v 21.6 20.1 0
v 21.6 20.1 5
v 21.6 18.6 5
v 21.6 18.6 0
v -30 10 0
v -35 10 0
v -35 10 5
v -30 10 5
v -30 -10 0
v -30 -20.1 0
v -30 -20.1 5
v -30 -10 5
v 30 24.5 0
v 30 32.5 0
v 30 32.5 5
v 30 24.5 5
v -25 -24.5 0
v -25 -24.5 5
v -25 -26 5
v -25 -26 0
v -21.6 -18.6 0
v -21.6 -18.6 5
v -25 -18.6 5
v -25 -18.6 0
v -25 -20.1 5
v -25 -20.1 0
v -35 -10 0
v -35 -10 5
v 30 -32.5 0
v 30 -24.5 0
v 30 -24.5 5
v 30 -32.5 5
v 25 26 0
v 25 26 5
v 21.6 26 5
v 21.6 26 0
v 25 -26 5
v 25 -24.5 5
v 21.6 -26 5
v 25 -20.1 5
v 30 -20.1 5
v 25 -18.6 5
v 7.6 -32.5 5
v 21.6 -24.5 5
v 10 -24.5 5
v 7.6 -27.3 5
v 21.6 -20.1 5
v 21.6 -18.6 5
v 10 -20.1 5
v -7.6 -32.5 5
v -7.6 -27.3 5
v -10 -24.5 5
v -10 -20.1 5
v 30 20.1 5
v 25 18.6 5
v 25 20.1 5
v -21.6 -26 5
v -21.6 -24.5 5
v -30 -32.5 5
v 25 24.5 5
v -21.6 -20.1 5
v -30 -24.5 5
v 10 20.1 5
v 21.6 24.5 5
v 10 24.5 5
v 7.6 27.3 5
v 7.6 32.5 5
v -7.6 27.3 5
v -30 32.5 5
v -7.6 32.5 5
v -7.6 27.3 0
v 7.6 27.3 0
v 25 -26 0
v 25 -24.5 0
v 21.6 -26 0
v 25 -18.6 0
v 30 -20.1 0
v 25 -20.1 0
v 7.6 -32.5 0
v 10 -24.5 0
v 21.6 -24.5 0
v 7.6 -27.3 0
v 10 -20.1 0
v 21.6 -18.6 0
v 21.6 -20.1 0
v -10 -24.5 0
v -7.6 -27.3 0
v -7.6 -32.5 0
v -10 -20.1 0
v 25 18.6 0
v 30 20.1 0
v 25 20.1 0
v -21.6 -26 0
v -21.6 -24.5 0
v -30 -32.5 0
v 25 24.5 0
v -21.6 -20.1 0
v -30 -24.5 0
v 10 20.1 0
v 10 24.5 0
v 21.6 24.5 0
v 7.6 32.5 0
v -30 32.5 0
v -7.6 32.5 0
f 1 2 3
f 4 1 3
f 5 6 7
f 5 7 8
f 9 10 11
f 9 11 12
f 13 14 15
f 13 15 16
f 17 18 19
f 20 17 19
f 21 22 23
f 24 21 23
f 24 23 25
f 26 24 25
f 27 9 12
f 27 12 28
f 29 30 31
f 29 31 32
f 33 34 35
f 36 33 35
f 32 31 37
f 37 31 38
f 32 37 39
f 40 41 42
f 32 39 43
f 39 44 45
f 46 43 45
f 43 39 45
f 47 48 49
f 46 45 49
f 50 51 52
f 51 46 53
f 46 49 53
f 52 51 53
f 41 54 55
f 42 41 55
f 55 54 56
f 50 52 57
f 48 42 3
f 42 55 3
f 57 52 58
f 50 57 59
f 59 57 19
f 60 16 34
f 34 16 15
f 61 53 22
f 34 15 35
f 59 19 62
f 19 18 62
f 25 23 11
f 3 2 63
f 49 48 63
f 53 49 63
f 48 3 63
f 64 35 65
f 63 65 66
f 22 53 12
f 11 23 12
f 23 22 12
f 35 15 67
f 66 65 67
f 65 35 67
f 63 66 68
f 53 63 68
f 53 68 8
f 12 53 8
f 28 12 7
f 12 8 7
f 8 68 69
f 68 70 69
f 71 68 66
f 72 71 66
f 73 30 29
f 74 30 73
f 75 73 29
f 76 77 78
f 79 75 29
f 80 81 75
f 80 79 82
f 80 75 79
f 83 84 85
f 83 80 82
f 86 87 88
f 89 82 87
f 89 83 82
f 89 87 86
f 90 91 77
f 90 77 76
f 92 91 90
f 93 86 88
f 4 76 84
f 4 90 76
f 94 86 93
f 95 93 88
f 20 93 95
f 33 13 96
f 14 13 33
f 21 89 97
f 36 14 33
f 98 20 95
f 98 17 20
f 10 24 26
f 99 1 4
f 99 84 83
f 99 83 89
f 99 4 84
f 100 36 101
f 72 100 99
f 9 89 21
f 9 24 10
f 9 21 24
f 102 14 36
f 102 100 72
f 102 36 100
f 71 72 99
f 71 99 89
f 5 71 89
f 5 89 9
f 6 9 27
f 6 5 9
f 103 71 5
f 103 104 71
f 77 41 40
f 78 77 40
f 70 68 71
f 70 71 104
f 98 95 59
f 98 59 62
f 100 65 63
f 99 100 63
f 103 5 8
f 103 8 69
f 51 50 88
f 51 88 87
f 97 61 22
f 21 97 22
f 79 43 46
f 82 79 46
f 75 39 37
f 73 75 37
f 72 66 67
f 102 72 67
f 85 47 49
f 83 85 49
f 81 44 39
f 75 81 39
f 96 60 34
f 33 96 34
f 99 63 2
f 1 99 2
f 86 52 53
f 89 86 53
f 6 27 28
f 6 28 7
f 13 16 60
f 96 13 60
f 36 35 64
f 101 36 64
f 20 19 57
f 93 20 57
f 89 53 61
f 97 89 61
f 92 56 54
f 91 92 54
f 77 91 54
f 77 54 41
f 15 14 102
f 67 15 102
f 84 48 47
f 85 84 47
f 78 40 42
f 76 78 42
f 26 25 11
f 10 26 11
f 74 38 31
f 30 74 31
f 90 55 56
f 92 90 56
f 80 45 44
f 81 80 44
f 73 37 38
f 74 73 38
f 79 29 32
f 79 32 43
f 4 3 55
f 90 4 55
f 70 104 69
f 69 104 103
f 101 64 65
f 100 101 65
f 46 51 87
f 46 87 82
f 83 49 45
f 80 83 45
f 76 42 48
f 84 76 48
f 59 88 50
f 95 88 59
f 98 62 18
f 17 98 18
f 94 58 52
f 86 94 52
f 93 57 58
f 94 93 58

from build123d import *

# Parameters (mm, degrees)
BOSS_EXTRUDE1_DEPTH = 5
CUT_EXTRUDE1_DEPTH  = 5
SKETCH4_W           = 15.2
SKETCH4_H           = 5.2
CUT_EXTRUDE2_DEPTH  = 10


with BuildPart() as part:
    # Sketch1 → Boss-Extrude1 (new body)
    with BuildSketch(Plane.XY):
        Polygon((-30, 32.5), (-7.5, 32.5), (30, 32.5), (30, -32.5), (-30, -32.5), (-30, -10), (-35, -10), (-35, 10), (-30, 10), align=None)
    extrude(amount=BOSS_EXTRUDE1_DEPTH)

    # Sketch3 → Cut-Extrude1 (cut)
    with BuildSketch(Plane.XY.offset(5)):
        Polygon((30, 24.5), (25, 24.5), (25, 26), (21.6, 26), (21.6, 24.5), (10, 24.5), (10, 20.1), (21.6, 20.1), (21.6, 18.6), (25, 18.6), (25, 20.1), (30, 20.1), align=None)
        Polygon((30, -24.5), (30, -20.1), (25, -20.1), (25, -18.6), (21.6, -18.6), (21.6, -20.1), (10, -20.1), (10, -24.5), (21.6, -24.5), (21.6, -26), (25, -26), (25, -24.5), align=None)
        Polygon((-30, -24.5), (-25, -24.5), (-25, -26), (-21.6, -26), (-21.6, -24.5), (-10, -24.5), (-10, -20.1), (-21.6, -20.1), (-21.6, -18.6), (-25, -18.6), (-25, -20.1), (-30, -20.1), align=None)
    extrude(amount=-CUT_EXTRUDE1_DEPTH, mode=Mode.SUBTRACT)

    # Sketch4 → Cut-Extrude2 (cut)
    with BuildSketch(Plane.XY.offset(5)):
        with Locations((0, -29.9)):
            Rectangle(SKETCH4_W, SKETCH4_H)
        with Locations((0, 29.9)):
            Rectangle(SKETCH4_W, SKETCH4_H)
    extrude(amount=-CUT_EXTRUDE2_DEPTH, mode=Mode.SUBTRACT)


solid = part.part
